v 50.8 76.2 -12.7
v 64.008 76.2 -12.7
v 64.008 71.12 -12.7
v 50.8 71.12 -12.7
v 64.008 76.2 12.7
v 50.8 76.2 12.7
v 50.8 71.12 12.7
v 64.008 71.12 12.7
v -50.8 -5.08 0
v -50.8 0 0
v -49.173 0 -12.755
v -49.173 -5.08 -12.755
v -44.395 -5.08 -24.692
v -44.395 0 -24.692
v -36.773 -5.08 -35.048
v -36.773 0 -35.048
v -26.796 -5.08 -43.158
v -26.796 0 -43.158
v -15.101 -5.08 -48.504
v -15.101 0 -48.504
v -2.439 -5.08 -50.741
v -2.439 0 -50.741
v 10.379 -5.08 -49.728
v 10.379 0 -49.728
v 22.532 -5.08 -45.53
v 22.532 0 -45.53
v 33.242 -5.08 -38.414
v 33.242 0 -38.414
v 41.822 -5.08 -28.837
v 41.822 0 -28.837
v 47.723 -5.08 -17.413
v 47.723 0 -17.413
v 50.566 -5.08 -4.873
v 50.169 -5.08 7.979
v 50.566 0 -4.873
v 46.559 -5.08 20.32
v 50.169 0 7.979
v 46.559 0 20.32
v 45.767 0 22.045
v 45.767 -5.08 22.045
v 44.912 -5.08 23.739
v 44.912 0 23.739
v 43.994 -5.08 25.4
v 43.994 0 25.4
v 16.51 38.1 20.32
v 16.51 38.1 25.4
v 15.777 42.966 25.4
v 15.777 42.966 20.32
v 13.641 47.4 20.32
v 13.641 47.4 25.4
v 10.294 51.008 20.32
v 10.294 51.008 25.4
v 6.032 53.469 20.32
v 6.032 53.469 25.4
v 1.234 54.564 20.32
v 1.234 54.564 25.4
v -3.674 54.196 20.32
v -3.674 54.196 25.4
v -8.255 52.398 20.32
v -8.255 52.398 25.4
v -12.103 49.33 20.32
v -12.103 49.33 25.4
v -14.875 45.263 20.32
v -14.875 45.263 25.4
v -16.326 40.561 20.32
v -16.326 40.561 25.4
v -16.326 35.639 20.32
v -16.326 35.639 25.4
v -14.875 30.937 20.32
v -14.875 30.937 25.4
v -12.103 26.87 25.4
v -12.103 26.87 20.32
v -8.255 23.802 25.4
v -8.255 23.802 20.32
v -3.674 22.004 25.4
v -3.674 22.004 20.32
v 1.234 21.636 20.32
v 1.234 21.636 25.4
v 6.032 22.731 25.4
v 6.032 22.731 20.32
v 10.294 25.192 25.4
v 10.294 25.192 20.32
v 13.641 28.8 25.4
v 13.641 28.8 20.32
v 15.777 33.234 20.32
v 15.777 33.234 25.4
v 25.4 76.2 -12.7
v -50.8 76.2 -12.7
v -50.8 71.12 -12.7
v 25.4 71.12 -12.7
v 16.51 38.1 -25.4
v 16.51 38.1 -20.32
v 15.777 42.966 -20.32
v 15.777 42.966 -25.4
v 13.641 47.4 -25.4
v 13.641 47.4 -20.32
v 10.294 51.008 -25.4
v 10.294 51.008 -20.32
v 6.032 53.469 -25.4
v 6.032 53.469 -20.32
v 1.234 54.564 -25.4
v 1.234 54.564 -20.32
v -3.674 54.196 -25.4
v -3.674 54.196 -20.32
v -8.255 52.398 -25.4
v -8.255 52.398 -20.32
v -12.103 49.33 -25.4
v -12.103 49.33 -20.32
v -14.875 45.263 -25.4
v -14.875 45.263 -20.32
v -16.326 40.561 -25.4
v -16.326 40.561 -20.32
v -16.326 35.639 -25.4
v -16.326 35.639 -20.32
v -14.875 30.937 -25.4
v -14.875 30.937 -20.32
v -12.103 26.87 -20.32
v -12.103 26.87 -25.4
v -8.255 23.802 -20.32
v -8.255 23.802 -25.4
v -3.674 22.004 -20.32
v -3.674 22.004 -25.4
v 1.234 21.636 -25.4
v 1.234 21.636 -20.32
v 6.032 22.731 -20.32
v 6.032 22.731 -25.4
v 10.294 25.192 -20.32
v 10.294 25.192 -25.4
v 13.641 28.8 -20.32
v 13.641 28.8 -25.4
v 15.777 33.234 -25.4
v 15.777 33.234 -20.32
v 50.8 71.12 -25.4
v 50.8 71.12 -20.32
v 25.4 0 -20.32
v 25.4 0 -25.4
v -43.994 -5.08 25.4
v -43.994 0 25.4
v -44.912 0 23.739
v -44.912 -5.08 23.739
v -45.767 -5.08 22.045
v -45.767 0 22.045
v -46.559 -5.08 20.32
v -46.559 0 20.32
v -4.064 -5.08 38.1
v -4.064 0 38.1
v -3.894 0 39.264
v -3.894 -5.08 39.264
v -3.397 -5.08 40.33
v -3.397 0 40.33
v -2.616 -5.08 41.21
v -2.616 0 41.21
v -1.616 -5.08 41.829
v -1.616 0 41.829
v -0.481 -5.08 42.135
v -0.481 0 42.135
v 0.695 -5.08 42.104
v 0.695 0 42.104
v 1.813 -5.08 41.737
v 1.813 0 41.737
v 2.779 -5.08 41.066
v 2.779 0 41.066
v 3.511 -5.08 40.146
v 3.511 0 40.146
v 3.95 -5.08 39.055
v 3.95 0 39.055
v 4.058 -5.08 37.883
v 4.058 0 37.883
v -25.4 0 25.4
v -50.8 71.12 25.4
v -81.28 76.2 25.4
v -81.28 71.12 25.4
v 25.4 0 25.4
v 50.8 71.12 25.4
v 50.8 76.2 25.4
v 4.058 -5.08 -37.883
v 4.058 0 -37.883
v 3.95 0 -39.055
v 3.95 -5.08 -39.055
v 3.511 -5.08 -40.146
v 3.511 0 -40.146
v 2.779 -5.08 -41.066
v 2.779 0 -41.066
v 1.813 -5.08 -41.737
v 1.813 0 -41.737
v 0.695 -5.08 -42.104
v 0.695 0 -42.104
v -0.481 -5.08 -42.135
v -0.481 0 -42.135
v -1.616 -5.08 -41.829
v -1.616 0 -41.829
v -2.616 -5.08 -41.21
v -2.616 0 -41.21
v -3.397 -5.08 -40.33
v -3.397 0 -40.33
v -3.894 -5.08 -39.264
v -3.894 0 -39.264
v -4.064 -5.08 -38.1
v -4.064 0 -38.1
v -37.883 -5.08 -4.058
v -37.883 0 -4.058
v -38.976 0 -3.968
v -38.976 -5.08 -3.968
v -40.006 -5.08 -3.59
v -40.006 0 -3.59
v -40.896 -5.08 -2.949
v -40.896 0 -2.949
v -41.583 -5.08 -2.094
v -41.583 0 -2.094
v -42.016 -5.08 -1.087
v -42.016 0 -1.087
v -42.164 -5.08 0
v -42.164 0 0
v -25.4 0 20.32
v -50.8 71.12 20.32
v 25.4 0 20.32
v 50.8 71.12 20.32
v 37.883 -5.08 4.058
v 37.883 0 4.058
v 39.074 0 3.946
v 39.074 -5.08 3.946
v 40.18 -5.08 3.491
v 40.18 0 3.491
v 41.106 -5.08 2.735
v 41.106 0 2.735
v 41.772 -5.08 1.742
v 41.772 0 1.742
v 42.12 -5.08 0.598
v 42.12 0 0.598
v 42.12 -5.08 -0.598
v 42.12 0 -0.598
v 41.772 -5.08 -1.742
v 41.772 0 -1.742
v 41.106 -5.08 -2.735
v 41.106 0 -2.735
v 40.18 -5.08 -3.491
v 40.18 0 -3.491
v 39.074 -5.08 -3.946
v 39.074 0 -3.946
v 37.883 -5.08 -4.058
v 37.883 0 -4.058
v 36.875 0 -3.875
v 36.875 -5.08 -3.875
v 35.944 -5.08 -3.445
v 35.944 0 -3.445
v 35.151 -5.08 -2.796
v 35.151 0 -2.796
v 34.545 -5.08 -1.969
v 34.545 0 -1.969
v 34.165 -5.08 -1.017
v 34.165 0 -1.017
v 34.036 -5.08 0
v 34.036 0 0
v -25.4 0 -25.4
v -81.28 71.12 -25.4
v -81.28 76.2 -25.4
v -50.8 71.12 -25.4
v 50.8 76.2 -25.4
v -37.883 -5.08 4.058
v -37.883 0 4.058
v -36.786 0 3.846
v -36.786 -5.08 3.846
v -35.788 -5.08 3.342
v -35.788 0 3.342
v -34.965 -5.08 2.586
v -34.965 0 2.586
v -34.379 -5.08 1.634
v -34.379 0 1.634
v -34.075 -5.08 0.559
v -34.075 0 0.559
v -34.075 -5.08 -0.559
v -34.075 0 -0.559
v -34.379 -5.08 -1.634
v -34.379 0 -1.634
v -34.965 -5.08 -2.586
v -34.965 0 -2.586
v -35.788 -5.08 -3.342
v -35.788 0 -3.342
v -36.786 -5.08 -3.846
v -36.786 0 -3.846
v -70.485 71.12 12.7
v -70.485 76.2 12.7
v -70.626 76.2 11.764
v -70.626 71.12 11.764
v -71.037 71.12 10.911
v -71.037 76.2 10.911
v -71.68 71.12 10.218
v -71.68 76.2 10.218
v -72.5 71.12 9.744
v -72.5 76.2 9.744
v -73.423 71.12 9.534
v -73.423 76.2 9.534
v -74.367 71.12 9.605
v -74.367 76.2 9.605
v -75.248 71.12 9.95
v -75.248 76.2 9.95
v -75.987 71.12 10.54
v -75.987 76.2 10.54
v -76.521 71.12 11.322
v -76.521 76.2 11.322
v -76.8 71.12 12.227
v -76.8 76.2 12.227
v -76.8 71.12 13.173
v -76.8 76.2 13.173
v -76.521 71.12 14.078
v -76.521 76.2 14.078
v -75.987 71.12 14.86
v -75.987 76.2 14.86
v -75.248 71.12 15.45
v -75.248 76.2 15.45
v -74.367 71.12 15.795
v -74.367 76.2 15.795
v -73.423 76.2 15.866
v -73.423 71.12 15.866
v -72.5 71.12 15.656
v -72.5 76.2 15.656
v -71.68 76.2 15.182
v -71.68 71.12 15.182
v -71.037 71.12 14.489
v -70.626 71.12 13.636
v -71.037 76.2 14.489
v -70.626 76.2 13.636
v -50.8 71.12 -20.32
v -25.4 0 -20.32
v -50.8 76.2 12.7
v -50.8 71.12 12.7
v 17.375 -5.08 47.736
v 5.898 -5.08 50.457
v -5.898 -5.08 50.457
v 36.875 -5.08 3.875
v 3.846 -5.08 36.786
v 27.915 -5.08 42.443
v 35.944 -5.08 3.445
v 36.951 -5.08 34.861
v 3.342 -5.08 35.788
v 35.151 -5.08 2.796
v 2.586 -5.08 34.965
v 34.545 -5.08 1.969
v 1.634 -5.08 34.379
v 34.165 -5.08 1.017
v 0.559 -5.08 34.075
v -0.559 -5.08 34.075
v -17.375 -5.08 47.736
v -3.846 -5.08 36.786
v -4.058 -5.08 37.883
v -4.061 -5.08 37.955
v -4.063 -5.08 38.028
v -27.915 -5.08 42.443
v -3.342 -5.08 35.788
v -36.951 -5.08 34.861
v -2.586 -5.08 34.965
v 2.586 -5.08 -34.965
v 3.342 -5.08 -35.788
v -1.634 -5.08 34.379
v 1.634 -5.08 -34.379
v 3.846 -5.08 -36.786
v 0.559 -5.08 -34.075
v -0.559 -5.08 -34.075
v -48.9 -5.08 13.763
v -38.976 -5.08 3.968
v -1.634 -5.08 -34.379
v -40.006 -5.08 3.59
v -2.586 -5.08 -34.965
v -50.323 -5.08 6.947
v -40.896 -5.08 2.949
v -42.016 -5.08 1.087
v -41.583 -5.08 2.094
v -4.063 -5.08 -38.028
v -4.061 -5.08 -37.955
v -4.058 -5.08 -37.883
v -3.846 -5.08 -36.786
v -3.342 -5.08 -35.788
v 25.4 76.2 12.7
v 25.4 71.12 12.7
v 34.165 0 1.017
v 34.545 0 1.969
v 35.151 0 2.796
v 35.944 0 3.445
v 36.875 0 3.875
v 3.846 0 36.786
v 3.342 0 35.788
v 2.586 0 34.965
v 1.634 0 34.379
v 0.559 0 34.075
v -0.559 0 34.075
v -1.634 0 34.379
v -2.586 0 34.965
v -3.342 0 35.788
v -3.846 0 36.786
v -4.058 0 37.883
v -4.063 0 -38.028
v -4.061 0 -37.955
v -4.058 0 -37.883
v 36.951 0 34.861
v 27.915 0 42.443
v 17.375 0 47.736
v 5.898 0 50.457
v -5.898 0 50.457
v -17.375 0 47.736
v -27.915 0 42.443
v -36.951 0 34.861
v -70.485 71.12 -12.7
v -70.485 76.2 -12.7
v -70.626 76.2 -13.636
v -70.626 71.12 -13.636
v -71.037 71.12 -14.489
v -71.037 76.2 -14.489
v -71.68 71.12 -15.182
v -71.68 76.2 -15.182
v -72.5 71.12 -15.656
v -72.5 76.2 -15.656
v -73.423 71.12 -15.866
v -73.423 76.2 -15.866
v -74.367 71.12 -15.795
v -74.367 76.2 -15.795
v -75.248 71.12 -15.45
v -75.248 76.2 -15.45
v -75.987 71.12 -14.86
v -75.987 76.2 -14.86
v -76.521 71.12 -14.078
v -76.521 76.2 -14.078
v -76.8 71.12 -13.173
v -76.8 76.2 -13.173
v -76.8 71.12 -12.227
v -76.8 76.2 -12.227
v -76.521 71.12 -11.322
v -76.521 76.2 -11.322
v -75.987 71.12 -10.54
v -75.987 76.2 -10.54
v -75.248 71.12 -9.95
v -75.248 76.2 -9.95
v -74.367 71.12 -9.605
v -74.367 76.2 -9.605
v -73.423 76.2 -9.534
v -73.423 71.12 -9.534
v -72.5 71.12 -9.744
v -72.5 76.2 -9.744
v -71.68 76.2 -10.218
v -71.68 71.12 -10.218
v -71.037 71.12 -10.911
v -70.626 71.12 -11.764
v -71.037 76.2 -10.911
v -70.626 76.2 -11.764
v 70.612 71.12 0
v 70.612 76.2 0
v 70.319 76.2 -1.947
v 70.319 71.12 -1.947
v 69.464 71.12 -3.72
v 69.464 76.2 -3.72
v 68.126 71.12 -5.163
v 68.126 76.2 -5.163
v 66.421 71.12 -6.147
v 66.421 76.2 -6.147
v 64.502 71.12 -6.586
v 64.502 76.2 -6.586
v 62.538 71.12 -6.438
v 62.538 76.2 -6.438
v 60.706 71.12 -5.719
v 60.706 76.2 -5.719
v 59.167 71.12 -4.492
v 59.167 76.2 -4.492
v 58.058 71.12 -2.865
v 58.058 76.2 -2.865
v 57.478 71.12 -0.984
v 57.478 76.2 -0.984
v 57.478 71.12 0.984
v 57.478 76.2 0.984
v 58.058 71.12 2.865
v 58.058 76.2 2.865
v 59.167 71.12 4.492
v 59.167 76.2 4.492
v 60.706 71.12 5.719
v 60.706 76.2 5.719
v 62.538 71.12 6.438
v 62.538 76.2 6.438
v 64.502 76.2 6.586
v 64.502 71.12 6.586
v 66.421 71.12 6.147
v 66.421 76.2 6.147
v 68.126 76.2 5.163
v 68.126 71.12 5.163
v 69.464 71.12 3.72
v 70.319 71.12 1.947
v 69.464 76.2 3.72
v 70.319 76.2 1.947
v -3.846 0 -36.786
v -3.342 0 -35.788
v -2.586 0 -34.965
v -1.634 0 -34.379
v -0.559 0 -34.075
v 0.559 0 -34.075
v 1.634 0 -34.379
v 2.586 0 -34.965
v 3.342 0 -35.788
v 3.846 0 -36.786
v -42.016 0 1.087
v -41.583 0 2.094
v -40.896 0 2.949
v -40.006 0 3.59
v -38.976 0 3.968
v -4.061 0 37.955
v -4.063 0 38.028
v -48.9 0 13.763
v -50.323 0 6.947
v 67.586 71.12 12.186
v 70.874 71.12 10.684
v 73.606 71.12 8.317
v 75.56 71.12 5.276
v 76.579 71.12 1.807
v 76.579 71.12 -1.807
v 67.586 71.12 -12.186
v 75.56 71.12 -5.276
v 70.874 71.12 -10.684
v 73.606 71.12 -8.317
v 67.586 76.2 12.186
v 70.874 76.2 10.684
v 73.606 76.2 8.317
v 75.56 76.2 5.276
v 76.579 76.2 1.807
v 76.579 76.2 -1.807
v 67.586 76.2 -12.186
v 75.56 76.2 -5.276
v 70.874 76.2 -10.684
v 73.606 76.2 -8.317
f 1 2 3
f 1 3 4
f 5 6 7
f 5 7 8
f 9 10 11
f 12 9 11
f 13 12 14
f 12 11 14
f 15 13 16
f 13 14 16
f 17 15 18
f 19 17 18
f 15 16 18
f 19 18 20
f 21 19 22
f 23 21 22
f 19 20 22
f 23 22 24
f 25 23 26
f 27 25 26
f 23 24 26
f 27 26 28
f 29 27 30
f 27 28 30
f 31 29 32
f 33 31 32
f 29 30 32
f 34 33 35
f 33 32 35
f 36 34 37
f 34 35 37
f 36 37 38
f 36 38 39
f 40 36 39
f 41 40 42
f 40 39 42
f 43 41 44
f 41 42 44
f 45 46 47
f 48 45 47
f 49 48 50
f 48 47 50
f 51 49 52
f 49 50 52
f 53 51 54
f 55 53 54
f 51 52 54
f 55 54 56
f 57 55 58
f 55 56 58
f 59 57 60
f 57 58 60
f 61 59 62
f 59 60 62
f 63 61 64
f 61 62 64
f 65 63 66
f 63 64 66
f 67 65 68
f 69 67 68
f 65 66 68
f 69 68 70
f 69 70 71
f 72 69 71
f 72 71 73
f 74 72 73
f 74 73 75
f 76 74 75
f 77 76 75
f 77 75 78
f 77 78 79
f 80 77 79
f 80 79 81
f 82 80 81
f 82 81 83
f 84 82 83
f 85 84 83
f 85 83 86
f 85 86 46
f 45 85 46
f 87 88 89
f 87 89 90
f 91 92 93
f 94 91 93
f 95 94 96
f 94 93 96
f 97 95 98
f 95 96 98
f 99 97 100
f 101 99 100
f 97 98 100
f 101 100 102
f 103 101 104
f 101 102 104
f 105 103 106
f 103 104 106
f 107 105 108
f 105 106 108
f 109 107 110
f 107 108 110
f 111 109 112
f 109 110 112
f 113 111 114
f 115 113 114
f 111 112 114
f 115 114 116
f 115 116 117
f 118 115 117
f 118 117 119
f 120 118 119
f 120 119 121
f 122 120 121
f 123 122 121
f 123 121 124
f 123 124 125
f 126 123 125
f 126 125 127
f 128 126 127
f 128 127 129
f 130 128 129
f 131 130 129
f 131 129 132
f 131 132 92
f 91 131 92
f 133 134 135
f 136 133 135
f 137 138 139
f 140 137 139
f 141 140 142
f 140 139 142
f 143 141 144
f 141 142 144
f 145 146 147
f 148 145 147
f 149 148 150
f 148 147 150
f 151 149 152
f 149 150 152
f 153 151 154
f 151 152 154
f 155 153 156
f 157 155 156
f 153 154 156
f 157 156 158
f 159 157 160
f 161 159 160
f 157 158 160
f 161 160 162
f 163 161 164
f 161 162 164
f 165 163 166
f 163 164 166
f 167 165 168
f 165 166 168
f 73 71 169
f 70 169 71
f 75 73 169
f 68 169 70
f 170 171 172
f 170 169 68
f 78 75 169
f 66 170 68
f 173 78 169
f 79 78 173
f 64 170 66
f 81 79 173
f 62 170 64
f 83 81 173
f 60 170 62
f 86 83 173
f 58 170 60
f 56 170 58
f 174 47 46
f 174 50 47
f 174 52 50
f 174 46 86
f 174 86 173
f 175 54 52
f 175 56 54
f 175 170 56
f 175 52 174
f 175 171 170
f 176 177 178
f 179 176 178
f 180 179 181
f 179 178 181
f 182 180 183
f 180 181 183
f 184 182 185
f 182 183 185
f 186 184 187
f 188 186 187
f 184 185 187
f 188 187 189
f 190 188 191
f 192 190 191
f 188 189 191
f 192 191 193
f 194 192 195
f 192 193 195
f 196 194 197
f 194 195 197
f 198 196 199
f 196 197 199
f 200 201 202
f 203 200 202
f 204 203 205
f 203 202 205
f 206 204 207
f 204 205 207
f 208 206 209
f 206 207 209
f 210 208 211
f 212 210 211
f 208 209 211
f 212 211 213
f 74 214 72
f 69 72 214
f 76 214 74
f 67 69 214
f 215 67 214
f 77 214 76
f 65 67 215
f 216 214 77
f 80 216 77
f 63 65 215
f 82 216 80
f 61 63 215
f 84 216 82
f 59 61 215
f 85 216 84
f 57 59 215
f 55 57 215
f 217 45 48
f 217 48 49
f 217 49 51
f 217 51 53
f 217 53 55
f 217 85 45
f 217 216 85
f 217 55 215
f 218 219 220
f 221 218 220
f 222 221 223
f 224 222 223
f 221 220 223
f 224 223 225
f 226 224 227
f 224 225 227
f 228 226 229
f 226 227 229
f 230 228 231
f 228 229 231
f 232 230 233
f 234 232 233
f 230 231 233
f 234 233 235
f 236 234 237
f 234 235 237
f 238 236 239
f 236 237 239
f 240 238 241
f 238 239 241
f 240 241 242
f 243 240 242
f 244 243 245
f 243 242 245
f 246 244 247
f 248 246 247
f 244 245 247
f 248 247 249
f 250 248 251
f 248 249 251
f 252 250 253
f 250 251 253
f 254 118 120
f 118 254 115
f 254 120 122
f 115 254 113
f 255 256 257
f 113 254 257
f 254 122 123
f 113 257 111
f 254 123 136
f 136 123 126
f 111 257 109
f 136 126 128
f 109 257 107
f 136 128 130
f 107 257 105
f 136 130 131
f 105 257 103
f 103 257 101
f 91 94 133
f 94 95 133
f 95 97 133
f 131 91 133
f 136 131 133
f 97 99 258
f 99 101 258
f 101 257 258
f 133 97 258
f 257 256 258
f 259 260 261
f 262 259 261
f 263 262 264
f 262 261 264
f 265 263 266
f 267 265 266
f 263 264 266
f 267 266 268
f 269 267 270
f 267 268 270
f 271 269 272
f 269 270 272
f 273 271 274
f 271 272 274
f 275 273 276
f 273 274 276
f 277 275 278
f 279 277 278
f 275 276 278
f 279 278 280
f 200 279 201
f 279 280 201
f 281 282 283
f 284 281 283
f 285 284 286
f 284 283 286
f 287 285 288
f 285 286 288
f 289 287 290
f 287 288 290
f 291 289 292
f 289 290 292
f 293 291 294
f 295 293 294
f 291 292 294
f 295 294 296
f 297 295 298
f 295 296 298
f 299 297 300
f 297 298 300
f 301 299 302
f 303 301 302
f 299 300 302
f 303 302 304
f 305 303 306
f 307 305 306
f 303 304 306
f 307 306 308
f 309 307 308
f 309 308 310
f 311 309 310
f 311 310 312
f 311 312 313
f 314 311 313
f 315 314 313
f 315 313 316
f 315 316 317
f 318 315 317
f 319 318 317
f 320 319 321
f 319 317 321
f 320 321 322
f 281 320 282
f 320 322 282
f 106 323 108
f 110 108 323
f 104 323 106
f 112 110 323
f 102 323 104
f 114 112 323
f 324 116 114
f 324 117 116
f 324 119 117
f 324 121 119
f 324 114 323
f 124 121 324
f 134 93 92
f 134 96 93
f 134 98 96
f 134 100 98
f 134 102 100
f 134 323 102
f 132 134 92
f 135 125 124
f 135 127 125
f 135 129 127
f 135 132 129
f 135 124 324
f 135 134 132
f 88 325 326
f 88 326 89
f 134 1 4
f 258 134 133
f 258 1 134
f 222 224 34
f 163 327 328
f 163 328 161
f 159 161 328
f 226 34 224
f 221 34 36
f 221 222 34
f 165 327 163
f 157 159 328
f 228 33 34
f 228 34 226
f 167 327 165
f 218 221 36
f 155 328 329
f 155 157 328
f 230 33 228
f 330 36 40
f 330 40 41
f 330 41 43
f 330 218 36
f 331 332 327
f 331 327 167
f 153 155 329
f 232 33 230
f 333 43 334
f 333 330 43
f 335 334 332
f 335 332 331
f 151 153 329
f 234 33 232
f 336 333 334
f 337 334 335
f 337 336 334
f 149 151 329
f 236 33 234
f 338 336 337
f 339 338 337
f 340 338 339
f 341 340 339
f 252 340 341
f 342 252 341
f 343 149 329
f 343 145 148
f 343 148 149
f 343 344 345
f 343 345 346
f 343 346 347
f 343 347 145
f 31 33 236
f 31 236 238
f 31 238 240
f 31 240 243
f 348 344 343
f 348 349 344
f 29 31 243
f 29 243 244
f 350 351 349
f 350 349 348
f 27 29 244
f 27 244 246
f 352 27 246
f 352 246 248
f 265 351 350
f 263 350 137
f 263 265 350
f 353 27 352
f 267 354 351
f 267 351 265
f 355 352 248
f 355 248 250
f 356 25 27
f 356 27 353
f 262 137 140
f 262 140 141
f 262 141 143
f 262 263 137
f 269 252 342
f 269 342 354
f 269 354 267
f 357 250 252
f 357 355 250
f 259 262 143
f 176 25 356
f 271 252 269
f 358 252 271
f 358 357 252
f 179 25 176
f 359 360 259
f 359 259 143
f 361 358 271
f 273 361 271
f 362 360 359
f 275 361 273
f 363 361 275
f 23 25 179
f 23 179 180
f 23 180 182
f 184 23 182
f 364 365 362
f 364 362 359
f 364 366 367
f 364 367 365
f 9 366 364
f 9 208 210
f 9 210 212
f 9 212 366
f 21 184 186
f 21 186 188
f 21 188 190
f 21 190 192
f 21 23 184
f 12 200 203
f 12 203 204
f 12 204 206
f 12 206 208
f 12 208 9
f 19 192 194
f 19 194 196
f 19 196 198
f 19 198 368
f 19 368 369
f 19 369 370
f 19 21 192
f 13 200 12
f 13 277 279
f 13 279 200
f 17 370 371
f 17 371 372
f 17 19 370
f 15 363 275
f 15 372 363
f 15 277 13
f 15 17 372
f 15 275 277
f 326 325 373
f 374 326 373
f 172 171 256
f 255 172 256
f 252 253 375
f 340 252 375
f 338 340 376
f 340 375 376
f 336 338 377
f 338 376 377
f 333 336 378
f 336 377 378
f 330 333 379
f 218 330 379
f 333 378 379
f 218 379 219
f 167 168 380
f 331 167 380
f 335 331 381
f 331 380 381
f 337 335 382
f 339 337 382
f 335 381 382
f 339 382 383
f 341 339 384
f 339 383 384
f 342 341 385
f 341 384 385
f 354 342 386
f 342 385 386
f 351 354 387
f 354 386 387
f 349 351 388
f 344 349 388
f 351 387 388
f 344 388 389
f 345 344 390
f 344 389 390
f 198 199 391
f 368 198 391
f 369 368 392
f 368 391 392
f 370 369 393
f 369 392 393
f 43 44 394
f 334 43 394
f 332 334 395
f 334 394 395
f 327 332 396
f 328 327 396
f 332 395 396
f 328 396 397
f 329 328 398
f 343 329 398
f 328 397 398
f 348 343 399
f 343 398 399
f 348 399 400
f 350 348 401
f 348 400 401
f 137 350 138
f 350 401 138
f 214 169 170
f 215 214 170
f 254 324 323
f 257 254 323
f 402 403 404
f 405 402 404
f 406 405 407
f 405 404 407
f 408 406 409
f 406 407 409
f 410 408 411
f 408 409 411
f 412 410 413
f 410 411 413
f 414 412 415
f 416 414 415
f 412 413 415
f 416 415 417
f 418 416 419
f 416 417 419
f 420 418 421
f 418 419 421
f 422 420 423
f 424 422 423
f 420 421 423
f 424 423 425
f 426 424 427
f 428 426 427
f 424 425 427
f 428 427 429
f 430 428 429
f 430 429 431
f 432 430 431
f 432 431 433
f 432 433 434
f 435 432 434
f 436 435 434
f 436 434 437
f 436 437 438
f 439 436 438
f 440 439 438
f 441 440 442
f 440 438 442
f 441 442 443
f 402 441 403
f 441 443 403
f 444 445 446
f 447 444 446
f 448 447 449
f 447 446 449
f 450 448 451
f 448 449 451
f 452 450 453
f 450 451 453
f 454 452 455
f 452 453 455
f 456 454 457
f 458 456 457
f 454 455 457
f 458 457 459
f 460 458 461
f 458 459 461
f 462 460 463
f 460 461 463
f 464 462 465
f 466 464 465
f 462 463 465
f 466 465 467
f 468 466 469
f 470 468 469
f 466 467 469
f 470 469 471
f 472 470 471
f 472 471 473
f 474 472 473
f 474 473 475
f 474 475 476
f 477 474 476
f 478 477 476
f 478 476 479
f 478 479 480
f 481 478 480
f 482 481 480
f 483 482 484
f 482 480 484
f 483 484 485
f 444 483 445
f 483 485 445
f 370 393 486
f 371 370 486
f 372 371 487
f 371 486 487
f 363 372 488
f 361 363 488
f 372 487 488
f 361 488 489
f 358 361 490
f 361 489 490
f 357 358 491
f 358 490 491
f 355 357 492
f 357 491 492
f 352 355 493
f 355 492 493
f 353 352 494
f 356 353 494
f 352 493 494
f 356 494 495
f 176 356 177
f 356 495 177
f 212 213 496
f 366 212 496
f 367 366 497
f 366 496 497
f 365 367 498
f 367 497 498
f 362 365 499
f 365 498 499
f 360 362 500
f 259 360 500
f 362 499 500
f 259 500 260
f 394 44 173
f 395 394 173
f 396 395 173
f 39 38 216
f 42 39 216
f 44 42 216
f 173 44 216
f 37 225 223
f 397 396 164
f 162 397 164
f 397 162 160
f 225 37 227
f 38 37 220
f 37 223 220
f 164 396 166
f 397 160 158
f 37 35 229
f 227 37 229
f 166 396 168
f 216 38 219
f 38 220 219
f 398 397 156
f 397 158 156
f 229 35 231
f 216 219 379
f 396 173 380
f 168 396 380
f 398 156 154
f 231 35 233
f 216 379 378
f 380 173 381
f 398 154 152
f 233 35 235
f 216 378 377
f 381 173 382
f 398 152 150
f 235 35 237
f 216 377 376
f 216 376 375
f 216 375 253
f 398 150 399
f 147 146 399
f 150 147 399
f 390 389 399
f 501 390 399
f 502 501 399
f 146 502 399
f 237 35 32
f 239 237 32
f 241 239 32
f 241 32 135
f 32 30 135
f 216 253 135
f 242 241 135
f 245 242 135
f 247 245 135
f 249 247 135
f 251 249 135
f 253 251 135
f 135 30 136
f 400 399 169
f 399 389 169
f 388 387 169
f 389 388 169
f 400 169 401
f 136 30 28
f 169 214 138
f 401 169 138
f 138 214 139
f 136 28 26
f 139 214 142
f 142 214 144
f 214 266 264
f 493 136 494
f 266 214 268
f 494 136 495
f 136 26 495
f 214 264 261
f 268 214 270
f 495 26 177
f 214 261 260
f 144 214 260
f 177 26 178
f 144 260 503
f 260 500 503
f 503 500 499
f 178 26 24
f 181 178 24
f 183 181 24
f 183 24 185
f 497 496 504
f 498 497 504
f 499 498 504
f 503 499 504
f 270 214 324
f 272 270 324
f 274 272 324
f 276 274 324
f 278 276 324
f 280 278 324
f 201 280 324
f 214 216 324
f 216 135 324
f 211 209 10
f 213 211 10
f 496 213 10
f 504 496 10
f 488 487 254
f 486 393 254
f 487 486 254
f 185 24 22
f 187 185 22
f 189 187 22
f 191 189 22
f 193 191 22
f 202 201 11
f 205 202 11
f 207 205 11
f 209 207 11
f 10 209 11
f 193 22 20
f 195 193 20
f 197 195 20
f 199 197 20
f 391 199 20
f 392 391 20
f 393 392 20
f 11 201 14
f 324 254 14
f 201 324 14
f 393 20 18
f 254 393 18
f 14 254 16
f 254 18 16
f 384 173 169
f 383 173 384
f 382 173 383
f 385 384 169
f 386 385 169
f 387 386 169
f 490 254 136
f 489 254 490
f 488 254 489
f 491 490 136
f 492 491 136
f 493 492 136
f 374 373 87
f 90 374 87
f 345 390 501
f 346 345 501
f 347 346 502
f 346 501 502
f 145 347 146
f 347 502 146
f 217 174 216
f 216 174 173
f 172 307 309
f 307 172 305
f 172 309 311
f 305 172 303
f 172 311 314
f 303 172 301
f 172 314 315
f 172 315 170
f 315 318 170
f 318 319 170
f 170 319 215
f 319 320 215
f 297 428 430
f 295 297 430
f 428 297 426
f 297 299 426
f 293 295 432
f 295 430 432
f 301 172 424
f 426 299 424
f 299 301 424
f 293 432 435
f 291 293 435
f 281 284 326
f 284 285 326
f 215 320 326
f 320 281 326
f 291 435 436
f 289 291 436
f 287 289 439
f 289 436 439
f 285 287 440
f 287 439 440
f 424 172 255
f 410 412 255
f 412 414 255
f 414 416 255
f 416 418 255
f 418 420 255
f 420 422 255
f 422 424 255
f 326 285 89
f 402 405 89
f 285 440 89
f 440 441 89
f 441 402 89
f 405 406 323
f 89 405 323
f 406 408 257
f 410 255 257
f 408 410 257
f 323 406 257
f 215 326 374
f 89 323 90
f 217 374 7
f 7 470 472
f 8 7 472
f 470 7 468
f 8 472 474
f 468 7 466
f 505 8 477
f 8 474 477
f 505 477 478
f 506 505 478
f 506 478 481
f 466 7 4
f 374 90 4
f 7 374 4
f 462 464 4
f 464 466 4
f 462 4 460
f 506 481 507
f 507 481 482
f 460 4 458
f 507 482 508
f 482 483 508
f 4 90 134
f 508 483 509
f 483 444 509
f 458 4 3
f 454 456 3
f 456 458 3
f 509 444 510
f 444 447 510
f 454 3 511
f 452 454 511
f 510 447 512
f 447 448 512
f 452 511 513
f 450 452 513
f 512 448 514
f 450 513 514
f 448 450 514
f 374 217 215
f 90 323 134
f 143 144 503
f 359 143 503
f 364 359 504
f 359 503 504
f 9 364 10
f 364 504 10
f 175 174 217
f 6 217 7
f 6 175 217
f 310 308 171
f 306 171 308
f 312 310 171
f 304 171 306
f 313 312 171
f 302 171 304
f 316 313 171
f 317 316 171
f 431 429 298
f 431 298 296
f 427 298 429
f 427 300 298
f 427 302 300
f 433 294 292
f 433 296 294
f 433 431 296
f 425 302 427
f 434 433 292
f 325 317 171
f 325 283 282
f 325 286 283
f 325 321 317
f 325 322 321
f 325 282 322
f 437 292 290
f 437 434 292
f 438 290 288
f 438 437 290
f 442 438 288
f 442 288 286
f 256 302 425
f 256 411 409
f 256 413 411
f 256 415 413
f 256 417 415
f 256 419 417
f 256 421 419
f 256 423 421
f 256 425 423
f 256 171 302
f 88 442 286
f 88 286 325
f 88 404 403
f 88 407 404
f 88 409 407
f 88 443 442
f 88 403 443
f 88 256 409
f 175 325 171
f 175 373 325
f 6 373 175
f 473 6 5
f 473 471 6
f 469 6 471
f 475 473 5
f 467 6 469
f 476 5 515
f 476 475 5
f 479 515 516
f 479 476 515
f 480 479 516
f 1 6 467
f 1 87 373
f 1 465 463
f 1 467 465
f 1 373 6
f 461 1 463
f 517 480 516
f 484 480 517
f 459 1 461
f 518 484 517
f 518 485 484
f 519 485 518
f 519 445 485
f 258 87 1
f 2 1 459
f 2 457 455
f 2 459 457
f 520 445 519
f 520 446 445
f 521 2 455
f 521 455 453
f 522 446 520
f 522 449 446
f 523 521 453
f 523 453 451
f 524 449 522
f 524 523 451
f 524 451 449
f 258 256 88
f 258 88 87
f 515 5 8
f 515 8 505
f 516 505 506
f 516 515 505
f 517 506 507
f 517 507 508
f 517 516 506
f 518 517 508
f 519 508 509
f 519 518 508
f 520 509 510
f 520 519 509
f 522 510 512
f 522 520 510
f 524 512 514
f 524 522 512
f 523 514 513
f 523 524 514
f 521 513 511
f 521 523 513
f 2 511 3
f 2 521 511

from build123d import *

# Parameters (mm, degrees)
BOSS_EXTRUDE1_DEPTH = 50.8
SKETCH2_W           = 30.48
SKETCH2_H           = 50.8
SKETCH2_R           = 3.175
SKETCH2_R_2         = 6.604
BOSS_EXTRUDE2_DEPTH = 5.08
SKETCH3_W           = 76.2
SKETCH3_H           = 25.4
CUT_EXTRUDE1_DEPTH  = 77.2
CUT_EXTRUDE2_DEPTH  = 51.8
BOSS_EXTRUDE3_DEPTH = 5.08
SKETCH6_R           = 16.51
CUT_EXTRUDE3_DEPTH  = 77.2


with BuildPart() as part:
    # Sketch1 → Boss-Extrude1 (new body, symmetric)
    with BuildSketch(Plane(origin=(0, 0, 0), x_dir=(0, 0, -1), z_dir=(1, 0, 0))):
        Polygon((-25.4, 0), (-20.32, 0), (-20.32, 71.12), (0, 71.12), (0, 76.2), (-25.4, 76.2), (-25.4, 71.12), align=None)
        Polygon((0, 76.2), (0, 71.12), (20.32, 71.12), (20.32, 0), (25.4, 0), (25.4, 71.12), (25.4, 76.2), align=None)
    extrude(amount=BOSS_EXTRUDE1_DEPTH, both=True)

    # Sketch2 → Boss-Extrude2 (add)
    with BuildSketch(Plane(origin=(0, 76.2, 0), x_dir=(1, 0, 0), z_dir=(0, 1, 0))):
        with Locations((-66.04, 0)):
            Rectangle(SKETCH2_W, SKETCH2_H)
        with Locations((-73.66, -12.7)):
            Circle(SKETCH2_R, mode=Mode.SUBTRACT)
        with Locations((-73.66, 12.7)):
            Circle(SKETCH2_R, mode=Mode.SUBTRACT)
        with BuildLine():
            Line((64.008, 12.7), (50.8, 12.7))
            Line((50.8, 12.7), (50.8, -12.7))
            Line((50.8, -12.7), (64.008, -12.7))
            ThreePointArc((64.008, -12.7), (76.708, 0), (64.008, 12.7))
        make_face()
        with Locations((64.008, 0)):
            Circle(SKETCH2_R_2, mode=Mode.SUBTRACT)
    extrude(amount=-BOSS_EXTRUDE2_DEPTH)

    # Sketch3 → Cut-Extrude1 (cut, through all)
    with BuildSketch(Plane(origin=(0, 76.2, 0), x_dir=(1, 0, 0), z_dir=(0, 1, 0))):
        with Locations((-12.7, 0)):
            Rectangle(SKETCH3_W, SKETCH3_H)
    extrude(amount=-CUT_EXTRUDE1_DEPTH, mode=Mode.SUBTRACT)

    # Sketch5 → Cut-Extrude2 (cut, through all)
    with BuildSketch(Plane.XY.offset(25.4)):
        Polygon((-25.4, 0), (-50.8, 71.12), (-50.8, 0), align=None)
        Polygon((50.8, 71.12), (25.4, 0), (50.8, 0), align=None)
    extrude(amount=-CUT_EXTRUDE2_DEPTH, mode=Mode.SUBTRACT)

    # Sketch4 → Boss-Extrude3 (add)
    with BuildSketch(Plane(origin=(0, 0, 0), x_dir=(-1, 0, 0), z_dir=(0, -1, 0))):
        with BuildLine():
            Line((-28.398063314, -25.4), (-43.994090512, -25.4))
            ThreePointArc((-43.994090512, -25.4), (0, -50.8), (43.994090512, -25.4))
            Line((43.994090512, -25.4), (28.398063314, -25.4))
            ThreePointArc((28.398063314, -25.4), (17.387076227, -33.901321217), (4.058215973, -37.883253333))
            ThreePointArc((4.058215973, -37.883253333), (4.062553736, -37.991588086), (4.064, -38.1))
            ThreePointArc((4.064, -38.1), (-0.108411914, -42.162553736), (-4.058215973, -37.883253333))
            ThreePointArc((-4.058215973, -37.883253333), (-17.387076227, -33.901321217), (-28.398063314, -25.4))
        make_face()
        with BuildLine():
            ThreePointArc((46.558969061, -20.32), (49.728440697, -10.378929899), (50.8, 0))
            ThreePointArc((50.8, 0), (-10.378929899, 49.728440697), (-46.558969061, -20.32))
            Line((-46.558969061, -20.32), (-32.228986953, -20.32))
            ThreePointArc((-32.228986953, -20.32), (-35.986705384, -12.512674997), (-37.883253333, -4.058215973))
            ThreePointArc((-37.883253333, -4.058215973), (-42.164, 0), (-37.883253333, 4.058215973))
            ThreePointArc((-37.883253333, 4.058215973), (-26.940768363, 26.940768363), (-4.058215973, 37.883253333))
            ThreePointArc((-4.058215973, 37.883253333), (-0.108411914, 42.162553736), (4.064, 38.1))
            ThreePointArc((4.064, 38.1), (4.062553736, 37.991588086), (4.058215973, 37.883253333))
            ThreePointArc((4.058215973, 37.883253333), (26.940768363, 26.940768363), (37.883253333, 4.058215973))
            ThreePointArc((37.883253333, 4.058215973), (40.896000496, 2.949318095), (42.164, 0))
            ThreePointArc((42.164, 0), (40.896000496, -2.949318095), (37.883253333, -4.058215973))
            ThreePointArc((37.883253333, -4.058215973), (35.986705384, -12.512674997), (32.228986953, -20.32))
            Line((32.228986953, -20.32), (46.558969061, -20.32))
        make_face()
        with BuildLine():
            ThreePointArc((-37.883253333, -4.058215973), (-35.986705384, -12.512674997), (-32.228986953, -20.32))
            Line((-32.228986953, -20.32), (32.228986953, -20.32))
            ThreePointArc((32.228986953, -20.32), (35.986705384, -12.512674997), (37.883253333, -4.058215973))
            ThreePointArc((37.883253333, -4.058215973), (34.036, 0), (37.883253333, 4.058215973))
            ThreePointArc((37.883253333, 4.058215973), (26.940768363, 26.940768363), (4.058215973, 37.883253333))
            ThreePointArc((4.058215973, 37.883253333), (0, 34.036), (-4.058215973, 37.883253333))
            ThreePointArc((-4.058215973, 37.883253333), (-26.940768363, 26.940768363), (-37.883253333, 4.058215973))
            ThreePointArc((-37.883253333, 4.058215973), (-35.150681905, 2.796000496), (-34.036, 0))
            ThreePointArc((-34.036, 0), (-35.150681905, -2.796000496), (-37.883253333, -4.058215973))
        make_face()
        with BuildLine():
            Line((-32.228986953, -20.32), (-46.558969061, -20.32))
            ThreePointArc((-46.558969061, -20.32), (-45.347720444, -22.895943975), (-43.994090512, -25.4))
            Line((-43.994090512, -25.4), (-28.398063314, -25.4))
            ThreePointArc((-28.398063314, -25.4), (-30.41975355, -22.940108848), (-32.228986953, -20.32))
        make_face()
        with BuildLine():
            ThreePointArc((43.994090512, -25.4), (45.347720444, -22.895943975), (46.558969061, -20.32))
            Line((46.558969061, -20.32), (32.228986953, -20.32))
            ThreePointArc((32.228986953, -20.32), (30.41975355, -22.940108848), (28.398063314, -25.4))
            Line((28.398063314, -25.4), (43.994090512, -25.4))
        make_face()
        with BuildLine():
            Line((28.398063314, -25.4), (-28.398063314, -25.4))
            ThreePointArc((-28.398063314, -25.4), (-17.387076227, -33.901321217), (-4.058215973, -37.883253333))
            ThreePointArc((-4.058215973, -37.883253333), (0, -34.036), (4.058215973, -37.883253333))
            ThreePointArc((4.058215973, -37.883253333), (17.387076227, -33.901321217), (28.398063314, -25.4))
        make_face()
        with BuildLine():
            Line((32.228986953, -20.32), (-32.228986953, -20.32))
            ThreePointArc((-32.228986953, -20.32), (-30.41975355, -22.940108848), (-28.398063314, -25.4))
            Line((-28.398063314, -25.4), (28.398063314, -25.4))
            ThreePointArc((28.398063314, -25.4), (30.41975355, -22.940108848), (32.228986953, -20.32))
        make_face()
    extrude(amount=BOSS_EXTRUDE3_DEPTH)

    # Sketch6 → Cut-Extrude3 (cut, through all)
    with BuildSketch(Plane.XY.offset(25.4)):
        with Locations((0, 38.1)):
            Circle(SKETCH6_R)
    extrude(amount=-CUT_EXTRUDE3_DEPTH, mode=Mode.SUBTRACT)


solid = part.part
